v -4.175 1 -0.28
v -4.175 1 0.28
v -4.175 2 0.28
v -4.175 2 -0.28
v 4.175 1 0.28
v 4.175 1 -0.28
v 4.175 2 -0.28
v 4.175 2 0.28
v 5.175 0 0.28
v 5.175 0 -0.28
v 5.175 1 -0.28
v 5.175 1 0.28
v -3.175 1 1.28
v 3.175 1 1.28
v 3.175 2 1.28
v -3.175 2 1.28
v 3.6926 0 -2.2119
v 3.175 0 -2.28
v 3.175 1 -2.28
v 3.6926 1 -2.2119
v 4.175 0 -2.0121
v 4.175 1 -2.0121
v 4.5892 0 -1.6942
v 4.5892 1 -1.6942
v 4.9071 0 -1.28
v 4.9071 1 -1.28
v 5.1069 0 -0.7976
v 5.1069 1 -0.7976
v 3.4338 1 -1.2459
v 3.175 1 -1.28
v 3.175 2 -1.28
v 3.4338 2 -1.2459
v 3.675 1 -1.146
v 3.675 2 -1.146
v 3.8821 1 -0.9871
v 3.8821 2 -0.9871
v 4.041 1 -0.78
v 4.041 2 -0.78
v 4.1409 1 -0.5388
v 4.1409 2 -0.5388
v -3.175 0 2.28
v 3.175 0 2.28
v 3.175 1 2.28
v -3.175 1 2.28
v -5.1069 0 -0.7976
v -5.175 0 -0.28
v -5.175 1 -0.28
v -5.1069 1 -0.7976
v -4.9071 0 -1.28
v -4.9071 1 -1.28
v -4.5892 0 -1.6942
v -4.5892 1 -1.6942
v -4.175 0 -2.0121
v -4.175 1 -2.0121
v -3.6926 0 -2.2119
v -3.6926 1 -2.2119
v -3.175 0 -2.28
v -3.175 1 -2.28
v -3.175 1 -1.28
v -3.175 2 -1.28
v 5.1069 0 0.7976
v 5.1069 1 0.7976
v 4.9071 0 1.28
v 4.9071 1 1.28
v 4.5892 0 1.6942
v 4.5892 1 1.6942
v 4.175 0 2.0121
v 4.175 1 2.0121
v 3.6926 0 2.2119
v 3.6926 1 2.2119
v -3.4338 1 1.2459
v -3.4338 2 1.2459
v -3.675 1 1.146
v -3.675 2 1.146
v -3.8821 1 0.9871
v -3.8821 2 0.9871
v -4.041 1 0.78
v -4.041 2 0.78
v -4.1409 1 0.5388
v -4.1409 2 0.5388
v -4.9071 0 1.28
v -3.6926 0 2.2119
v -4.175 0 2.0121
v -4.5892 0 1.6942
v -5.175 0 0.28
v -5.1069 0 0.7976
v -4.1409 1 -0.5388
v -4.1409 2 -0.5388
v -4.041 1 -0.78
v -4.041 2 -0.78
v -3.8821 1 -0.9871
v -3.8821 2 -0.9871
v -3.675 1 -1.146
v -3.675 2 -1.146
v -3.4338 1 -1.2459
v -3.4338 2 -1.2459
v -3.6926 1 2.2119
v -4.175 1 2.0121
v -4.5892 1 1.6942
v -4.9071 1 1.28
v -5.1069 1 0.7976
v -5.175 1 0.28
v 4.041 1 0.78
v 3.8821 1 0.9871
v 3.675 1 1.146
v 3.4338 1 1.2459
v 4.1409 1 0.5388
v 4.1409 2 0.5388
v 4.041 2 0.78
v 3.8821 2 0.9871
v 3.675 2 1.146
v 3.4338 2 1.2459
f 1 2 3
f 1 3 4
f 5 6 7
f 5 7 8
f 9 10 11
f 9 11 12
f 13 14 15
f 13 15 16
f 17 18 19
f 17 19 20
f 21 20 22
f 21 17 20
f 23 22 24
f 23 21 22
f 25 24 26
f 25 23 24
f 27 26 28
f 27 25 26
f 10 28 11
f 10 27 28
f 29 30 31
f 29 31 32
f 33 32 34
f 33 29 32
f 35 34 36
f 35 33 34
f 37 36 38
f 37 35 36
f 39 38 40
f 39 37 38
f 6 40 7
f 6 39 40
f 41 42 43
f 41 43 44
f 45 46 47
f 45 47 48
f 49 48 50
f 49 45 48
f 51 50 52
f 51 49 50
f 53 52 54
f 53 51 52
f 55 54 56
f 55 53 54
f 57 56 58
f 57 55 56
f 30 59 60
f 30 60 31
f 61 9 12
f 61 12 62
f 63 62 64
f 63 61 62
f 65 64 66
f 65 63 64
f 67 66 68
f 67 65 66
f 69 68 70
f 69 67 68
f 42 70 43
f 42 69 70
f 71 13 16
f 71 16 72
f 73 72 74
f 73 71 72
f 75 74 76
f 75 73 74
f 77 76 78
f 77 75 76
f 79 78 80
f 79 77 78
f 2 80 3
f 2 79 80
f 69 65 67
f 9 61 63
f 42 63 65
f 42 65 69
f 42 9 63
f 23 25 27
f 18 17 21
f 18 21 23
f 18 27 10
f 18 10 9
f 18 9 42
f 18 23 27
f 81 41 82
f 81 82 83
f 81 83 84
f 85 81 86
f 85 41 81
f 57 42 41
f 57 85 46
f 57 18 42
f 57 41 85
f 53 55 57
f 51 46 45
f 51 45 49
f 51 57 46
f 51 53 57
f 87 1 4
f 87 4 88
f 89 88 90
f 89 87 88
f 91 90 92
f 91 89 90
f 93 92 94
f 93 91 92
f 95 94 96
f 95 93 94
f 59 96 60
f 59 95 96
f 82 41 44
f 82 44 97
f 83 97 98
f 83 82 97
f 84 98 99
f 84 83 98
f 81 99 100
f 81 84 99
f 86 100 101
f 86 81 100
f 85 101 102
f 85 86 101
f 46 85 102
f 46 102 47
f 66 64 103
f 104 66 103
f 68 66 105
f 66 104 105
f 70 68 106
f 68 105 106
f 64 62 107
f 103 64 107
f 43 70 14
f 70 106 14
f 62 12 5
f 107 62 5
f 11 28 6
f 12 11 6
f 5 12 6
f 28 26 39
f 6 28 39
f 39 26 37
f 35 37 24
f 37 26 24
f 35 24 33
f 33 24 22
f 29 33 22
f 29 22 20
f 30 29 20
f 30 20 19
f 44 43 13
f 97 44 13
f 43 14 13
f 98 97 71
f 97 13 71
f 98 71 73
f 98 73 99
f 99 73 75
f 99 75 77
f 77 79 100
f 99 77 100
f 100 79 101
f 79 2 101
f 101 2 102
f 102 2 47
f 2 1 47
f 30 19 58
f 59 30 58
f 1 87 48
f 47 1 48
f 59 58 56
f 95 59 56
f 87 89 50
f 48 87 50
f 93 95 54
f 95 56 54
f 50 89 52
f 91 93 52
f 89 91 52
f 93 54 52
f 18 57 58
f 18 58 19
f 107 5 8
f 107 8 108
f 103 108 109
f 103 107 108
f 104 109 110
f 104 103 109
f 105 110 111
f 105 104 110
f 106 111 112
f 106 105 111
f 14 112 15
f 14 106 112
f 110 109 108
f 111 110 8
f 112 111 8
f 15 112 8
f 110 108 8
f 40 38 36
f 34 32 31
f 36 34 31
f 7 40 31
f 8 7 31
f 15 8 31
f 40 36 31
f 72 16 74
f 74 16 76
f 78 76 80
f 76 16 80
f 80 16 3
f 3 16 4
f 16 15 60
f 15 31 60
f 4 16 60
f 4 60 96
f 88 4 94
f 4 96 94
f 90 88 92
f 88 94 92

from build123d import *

# Parameters (mm, degrees)
BOSS_EXTRUDE1_DEPTH = 1
BOSS_EXTRUDE2_DEPTH = 2


with BuildPart() as part:
    # Sketch1 → Boss-Extrude1 (new body)
    with BuildSketch(Plane(origin=(0, 0, 0), x_dir=(1, 0, 0), z_dir=(0, 1, 0))):
        with BuildLine():
            Line((-3.175, 2.28), (3.175, 2.28))
            ThreePointArc((3.175, 2.28), (4.589213562, 1.694213562), (5.175, 0.28))
            Line((5.175, 0.28), (5.175, -0.28))
            ThreePointArc((5.175, -0.28), (4.589213562, -1.694213562), (3.175, -2.28))
            Line((3.175, -2.28), (-3.175, -2.28))
            ThreePointArc((-3.175, -2.28), (-4.589213562, -1.694213562), (-5.175, -0.28))
            Line((-5.175, -0.28), (-5.175, 0.28))
            ThreePointArc((-5.175, 0.28), (-4.589213562, 1.694213562), (-3.175, 2.28))
        make_face()
        with BuildLine():
            Line((-3.175, -1.28), (3.175, -1.28))
            ThreePointArc((3.175, -1.28), (3.882106781, -0.987106781), (4.175, -0.28))
            Line((4.175, -0.28), (4.175, 0.28))
            ThreePointArc((4.175, 0.28), (3.882106781, 0.987106781), (3.175, 1.28))
            Line((3.175, 1.28), (-3.175, 1.28))
            ThreePointArc((-3.175, 1.28), (-3.882106781, 0.987106781), (-4.175, 0.28))
            Line((-4.175, 0.28), (-4.175, -0.28))
            ThreePointArc((-4.175, -0.28), (-3.882106781, -0.987106781), (-3.175, -1.28))
        make_face(mode=Mode.SUBTRACT)
    extrude(amount=BOSS_EXTRUDE1_DEPTH)

    # Sketch1<2> → Boss-Extrude2 (add)
    with BuildSketch(Plane(origin=(0, 0, 0), x_dir=(1, 0, 0), z_dir=(0, 1, 0))):
        with BuildLine():
            ThreePointArc((-4.175, -0.28), (-3.882106781, -0.987106781), (-3.175, -1.28))
            Line((-3.175, -1.28), (3.175, -1.28))
            ThreePointArc((3.175, -1.28), (3.882106781, -0.987106781), (4.175, -0.28))
            Line((4.175, -0.28), (4.175, 0.28))
            ThreePointArc((4.175, 0.28), (3.882106781, 0.987106781), (3.175, 1.28))
            Line((3.175, 1.28), (-3.175, 1.28))
            ThreePointArc((-3.175, 1.28), (-3.882106781, 0.987106781), (-4.175, 0.28))
            Line((-4.175, 0.28), (-4.175, -0.28))
        make_face()
    extrude(amount=BOSS_EXTRUDE2_DEPTH)


solid = part.part
